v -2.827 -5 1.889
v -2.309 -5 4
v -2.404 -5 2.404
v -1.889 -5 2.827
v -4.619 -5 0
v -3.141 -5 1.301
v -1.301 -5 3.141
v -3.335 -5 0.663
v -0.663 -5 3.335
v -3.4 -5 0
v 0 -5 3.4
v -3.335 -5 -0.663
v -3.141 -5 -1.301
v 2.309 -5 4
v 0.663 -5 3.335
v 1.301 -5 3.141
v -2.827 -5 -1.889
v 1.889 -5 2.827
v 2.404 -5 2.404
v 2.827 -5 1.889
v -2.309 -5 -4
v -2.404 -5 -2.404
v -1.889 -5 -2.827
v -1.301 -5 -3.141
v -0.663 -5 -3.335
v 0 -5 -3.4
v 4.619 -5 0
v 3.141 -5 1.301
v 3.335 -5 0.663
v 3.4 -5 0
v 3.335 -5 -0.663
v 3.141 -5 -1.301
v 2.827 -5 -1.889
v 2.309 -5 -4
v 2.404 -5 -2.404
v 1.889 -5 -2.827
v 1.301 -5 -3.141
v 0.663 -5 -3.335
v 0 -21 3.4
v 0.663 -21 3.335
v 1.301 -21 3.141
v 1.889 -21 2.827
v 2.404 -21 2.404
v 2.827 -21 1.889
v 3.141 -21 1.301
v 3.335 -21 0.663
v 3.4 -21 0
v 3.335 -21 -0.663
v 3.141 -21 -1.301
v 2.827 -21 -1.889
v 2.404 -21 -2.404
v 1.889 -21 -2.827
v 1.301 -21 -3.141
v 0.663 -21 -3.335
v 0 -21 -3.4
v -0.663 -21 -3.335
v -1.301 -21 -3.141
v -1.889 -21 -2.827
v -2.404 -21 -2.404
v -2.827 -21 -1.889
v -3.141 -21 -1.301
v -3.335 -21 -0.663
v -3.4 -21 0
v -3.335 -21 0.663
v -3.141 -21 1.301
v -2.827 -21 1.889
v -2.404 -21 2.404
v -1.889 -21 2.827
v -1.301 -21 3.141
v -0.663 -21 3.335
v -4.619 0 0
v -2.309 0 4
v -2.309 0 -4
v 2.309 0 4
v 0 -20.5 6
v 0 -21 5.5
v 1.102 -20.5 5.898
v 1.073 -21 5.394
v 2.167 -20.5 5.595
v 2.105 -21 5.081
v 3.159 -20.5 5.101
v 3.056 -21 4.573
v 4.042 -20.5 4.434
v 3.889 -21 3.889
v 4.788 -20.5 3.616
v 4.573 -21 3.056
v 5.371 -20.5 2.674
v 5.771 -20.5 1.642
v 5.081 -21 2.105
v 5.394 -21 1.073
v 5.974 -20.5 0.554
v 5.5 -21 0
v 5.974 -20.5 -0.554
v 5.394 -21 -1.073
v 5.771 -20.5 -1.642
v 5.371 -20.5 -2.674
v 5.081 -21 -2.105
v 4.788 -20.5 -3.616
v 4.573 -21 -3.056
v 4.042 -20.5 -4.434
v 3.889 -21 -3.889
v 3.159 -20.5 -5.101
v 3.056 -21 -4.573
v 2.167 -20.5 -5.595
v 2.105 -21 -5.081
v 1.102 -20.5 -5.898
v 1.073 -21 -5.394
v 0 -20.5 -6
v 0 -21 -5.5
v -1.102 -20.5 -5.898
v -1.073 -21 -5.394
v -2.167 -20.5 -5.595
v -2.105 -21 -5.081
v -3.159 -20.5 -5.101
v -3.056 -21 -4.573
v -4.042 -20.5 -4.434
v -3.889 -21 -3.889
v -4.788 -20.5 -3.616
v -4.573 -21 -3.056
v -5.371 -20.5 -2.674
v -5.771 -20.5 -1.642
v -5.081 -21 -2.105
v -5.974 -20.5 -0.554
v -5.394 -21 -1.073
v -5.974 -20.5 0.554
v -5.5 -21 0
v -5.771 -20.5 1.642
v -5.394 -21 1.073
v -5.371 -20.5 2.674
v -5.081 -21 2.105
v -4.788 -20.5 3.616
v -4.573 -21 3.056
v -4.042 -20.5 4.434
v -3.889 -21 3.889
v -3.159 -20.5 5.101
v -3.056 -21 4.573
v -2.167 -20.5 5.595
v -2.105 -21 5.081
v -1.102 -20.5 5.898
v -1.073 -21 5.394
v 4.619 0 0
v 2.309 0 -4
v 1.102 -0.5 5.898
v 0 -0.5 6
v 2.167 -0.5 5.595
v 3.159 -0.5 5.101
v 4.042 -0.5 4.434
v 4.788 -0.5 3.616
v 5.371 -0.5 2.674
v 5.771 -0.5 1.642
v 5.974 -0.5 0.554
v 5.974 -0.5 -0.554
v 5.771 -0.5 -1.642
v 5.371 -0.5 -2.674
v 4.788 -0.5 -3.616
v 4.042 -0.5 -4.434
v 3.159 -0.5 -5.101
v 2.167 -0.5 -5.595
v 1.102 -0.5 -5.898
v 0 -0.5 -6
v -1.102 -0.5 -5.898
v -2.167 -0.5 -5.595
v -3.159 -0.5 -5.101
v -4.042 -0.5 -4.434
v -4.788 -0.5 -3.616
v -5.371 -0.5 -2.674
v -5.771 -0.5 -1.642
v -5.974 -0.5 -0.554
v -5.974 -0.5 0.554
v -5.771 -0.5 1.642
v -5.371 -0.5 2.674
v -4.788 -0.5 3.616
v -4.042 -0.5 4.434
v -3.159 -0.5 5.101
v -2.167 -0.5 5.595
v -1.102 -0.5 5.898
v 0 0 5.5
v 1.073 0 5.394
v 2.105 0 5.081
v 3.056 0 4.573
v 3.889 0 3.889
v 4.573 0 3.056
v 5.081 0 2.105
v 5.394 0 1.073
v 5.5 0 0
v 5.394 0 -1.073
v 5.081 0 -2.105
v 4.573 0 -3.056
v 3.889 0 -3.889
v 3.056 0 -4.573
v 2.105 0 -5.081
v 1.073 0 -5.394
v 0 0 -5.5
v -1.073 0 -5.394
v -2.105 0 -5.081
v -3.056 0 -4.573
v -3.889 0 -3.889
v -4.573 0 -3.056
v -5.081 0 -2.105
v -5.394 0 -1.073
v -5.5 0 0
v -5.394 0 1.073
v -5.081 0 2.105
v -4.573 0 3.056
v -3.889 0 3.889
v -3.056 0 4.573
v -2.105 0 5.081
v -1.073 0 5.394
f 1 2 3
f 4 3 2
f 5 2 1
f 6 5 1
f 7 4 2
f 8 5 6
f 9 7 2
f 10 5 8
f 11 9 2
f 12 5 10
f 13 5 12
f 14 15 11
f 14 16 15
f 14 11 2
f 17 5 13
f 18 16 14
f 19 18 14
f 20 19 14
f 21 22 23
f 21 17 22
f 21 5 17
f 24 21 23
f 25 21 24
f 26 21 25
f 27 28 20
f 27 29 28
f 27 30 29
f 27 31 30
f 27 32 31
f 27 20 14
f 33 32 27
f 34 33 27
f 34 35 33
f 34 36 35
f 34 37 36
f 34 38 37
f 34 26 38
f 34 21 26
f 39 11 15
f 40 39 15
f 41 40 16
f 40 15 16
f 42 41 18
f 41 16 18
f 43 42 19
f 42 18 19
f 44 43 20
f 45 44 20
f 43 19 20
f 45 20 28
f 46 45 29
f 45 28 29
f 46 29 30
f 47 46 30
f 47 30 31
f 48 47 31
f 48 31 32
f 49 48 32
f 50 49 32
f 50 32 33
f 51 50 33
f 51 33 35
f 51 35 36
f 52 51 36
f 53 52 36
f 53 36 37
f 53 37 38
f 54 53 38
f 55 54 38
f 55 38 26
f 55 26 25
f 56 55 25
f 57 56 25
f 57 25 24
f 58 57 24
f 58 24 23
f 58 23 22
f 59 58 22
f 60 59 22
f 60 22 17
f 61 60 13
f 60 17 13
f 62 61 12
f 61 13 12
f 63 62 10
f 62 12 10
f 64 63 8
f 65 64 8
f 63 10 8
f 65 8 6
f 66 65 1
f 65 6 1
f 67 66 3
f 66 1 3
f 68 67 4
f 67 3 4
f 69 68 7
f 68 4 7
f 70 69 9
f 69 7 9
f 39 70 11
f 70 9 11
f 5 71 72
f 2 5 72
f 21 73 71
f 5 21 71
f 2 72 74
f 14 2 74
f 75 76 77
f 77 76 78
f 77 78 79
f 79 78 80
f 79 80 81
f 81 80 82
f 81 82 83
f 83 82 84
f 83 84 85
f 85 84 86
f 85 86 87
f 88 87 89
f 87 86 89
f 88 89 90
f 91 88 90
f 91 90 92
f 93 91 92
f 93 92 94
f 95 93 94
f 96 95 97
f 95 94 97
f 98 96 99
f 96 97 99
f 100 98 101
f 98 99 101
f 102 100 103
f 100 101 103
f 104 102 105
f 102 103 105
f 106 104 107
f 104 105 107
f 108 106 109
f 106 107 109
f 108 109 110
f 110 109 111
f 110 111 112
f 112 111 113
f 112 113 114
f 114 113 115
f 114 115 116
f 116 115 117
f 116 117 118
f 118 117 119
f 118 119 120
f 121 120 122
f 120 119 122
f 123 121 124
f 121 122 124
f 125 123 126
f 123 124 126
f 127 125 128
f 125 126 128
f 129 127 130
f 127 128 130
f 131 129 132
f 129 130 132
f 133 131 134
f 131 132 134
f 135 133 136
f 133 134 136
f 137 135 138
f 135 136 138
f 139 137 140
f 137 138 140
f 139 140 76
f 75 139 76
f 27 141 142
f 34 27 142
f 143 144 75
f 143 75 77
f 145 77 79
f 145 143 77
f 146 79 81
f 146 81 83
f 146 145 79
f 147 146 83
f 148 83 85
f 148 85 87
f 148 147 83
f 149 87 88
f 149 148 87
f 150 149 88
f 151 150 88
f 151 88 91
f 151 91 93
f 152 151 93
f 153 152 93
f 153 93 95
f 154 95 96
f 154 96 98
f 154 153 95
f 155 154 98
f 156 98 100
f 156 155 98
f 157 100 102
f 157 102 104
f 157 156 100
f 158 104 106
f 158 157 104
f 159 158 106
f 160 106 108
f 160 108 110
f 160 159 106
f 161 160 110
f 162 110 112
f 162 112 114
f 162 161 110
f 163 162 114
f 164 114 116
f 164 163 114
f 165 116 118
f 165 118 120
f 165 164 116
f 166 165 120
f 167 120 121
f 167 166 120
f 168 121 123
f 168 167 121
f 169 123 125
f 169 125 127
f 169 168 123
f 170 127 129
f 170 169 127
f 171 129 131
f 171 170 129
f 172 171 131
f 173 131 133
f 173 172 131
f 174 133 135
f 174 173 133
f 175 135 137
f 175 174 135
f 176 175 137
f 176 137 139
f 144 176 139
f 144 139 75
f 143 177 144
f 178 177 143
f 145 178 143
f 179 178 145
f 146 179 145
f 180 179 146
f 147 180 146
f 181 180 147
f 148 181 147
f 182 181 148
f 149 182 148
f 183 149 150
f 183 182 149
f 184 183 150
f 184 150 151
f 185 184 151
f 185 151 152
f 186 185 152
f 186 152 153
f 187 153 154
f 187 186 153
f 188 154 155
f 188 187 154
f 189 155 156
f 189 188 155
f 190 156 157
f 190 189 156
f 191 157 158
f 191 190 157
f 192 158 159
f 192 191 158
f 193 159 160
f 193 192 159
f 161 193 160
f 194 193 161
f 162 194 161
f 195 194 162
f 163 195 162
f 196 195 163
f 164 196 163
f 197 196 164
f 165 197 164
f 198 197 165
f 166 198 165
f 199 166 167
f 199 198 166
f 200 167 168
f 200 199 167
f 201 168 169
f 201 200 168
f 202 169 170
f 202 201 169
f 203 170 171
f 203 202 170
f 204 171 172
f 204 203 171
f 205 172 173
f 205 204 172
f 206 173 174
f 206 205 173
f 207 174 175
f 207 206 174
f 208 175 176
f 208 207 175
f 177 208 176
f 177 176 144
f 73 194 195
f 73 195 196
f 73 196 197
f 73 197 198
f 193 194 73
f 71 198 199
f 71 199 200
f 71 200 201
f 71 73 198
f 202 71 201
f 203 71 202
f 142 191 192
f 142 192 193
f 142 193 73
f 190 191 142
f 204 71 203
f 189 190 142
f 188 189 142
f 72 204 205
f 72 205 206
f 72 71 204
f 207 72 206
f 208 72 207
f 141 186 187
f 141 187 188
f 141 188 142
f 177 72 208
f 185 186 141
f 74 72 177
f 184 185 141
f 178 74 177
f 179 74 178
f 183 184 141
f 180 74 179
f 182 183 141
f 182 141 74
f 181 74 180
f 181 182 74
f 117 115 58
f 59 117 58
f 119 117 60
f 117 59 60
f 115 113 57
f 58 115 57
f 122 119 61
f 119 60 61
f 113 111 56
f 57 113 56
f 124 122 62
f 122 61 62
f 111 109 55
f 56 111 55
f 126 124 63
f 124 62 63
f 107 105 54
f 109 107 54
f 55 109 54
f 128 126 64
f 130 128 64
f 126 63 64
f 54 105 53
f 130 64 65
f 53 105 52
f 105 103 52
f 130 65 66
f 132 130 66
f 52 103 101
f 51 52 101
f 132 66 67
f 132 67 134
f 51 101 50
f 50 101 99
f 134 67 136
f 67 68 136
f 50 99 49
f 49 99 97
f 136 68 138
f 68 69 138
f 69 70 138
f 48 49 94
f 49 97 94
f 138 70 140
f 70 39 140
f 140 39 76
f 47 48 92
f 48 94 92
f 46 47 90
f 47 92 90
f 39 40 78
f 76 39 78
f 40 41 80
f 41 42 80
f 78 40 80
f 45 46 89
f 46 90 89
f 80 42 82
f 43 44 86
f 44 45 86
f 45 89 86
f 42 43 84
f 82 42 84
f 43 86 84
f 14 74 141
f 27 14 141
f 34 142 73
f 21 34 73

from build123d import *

# Parameters (mm, degrees)
SKETCH1_R           = 6
BOSS_EXTRUDE1_DEPTH = 21
SKETCH2_R           = 3.4
CUT_EXTRUDE1_DEPTH  = 23.649503306
CUT_EXTRUDE2_DEPTH  = 5
CHAMFER1_SIZE       = 0.5


with BuildPart() as part:
    # Sketch1 → Boss-Extrude1 (new body)
    with BuildSketch(Plane(origin=(0, 0, 0), x_dir=(1, 0, 0), z_dir=(0, 1, 0))):
        with Locations(Location((0, 0, 0), (0, 0, 270))):
            Circle(SKETCH1_R)
    extrude(amount=-BOSS_EXTRUDE1_DEPTH)

    # Sketch2 → Cut-Extrude1 (cut, through all)
    with BuildSketch(Plane(origin=(0, 0, 0), x_dir=(1, 0, 0), z_dir=(0, 1, 0))):
        with Locations(Location((0, 0, 0), (0, 0, 270))):
            Circle(SKETCH2_R)
    extrude(amount=-CUT_EXTRUDE1_DEPTH, mode=Mode.SUBTRACT)

    # Sketch3 → Cut-Extrude2 (cut)
    with BuildSketch(Plane(origin=(0, 0, 0), x_dir=(1, 0, 0), z_dir=(0, 1, 0))):
        Polygon((4.618802154, 0), (2.309401077, 4), (-2.309401077, 4), (-4.618802154, 0), (-2.309401077, -4), (2.309401077, -4), align=None)
    extrude(amount=-CUT_EXTRUDE2_DEPTH, mode=Mode.SUBTRACT)

    # Chamfer1
    chamfer1_edges = [part.edges().sort_by_distance(p)[0] for p in [
        (0, 0, -6),
        (0, -21, -6),
    ]]
    chamfer(chamfer1_edges, length=CHAMFER1_SIZE)


solid = part.part
